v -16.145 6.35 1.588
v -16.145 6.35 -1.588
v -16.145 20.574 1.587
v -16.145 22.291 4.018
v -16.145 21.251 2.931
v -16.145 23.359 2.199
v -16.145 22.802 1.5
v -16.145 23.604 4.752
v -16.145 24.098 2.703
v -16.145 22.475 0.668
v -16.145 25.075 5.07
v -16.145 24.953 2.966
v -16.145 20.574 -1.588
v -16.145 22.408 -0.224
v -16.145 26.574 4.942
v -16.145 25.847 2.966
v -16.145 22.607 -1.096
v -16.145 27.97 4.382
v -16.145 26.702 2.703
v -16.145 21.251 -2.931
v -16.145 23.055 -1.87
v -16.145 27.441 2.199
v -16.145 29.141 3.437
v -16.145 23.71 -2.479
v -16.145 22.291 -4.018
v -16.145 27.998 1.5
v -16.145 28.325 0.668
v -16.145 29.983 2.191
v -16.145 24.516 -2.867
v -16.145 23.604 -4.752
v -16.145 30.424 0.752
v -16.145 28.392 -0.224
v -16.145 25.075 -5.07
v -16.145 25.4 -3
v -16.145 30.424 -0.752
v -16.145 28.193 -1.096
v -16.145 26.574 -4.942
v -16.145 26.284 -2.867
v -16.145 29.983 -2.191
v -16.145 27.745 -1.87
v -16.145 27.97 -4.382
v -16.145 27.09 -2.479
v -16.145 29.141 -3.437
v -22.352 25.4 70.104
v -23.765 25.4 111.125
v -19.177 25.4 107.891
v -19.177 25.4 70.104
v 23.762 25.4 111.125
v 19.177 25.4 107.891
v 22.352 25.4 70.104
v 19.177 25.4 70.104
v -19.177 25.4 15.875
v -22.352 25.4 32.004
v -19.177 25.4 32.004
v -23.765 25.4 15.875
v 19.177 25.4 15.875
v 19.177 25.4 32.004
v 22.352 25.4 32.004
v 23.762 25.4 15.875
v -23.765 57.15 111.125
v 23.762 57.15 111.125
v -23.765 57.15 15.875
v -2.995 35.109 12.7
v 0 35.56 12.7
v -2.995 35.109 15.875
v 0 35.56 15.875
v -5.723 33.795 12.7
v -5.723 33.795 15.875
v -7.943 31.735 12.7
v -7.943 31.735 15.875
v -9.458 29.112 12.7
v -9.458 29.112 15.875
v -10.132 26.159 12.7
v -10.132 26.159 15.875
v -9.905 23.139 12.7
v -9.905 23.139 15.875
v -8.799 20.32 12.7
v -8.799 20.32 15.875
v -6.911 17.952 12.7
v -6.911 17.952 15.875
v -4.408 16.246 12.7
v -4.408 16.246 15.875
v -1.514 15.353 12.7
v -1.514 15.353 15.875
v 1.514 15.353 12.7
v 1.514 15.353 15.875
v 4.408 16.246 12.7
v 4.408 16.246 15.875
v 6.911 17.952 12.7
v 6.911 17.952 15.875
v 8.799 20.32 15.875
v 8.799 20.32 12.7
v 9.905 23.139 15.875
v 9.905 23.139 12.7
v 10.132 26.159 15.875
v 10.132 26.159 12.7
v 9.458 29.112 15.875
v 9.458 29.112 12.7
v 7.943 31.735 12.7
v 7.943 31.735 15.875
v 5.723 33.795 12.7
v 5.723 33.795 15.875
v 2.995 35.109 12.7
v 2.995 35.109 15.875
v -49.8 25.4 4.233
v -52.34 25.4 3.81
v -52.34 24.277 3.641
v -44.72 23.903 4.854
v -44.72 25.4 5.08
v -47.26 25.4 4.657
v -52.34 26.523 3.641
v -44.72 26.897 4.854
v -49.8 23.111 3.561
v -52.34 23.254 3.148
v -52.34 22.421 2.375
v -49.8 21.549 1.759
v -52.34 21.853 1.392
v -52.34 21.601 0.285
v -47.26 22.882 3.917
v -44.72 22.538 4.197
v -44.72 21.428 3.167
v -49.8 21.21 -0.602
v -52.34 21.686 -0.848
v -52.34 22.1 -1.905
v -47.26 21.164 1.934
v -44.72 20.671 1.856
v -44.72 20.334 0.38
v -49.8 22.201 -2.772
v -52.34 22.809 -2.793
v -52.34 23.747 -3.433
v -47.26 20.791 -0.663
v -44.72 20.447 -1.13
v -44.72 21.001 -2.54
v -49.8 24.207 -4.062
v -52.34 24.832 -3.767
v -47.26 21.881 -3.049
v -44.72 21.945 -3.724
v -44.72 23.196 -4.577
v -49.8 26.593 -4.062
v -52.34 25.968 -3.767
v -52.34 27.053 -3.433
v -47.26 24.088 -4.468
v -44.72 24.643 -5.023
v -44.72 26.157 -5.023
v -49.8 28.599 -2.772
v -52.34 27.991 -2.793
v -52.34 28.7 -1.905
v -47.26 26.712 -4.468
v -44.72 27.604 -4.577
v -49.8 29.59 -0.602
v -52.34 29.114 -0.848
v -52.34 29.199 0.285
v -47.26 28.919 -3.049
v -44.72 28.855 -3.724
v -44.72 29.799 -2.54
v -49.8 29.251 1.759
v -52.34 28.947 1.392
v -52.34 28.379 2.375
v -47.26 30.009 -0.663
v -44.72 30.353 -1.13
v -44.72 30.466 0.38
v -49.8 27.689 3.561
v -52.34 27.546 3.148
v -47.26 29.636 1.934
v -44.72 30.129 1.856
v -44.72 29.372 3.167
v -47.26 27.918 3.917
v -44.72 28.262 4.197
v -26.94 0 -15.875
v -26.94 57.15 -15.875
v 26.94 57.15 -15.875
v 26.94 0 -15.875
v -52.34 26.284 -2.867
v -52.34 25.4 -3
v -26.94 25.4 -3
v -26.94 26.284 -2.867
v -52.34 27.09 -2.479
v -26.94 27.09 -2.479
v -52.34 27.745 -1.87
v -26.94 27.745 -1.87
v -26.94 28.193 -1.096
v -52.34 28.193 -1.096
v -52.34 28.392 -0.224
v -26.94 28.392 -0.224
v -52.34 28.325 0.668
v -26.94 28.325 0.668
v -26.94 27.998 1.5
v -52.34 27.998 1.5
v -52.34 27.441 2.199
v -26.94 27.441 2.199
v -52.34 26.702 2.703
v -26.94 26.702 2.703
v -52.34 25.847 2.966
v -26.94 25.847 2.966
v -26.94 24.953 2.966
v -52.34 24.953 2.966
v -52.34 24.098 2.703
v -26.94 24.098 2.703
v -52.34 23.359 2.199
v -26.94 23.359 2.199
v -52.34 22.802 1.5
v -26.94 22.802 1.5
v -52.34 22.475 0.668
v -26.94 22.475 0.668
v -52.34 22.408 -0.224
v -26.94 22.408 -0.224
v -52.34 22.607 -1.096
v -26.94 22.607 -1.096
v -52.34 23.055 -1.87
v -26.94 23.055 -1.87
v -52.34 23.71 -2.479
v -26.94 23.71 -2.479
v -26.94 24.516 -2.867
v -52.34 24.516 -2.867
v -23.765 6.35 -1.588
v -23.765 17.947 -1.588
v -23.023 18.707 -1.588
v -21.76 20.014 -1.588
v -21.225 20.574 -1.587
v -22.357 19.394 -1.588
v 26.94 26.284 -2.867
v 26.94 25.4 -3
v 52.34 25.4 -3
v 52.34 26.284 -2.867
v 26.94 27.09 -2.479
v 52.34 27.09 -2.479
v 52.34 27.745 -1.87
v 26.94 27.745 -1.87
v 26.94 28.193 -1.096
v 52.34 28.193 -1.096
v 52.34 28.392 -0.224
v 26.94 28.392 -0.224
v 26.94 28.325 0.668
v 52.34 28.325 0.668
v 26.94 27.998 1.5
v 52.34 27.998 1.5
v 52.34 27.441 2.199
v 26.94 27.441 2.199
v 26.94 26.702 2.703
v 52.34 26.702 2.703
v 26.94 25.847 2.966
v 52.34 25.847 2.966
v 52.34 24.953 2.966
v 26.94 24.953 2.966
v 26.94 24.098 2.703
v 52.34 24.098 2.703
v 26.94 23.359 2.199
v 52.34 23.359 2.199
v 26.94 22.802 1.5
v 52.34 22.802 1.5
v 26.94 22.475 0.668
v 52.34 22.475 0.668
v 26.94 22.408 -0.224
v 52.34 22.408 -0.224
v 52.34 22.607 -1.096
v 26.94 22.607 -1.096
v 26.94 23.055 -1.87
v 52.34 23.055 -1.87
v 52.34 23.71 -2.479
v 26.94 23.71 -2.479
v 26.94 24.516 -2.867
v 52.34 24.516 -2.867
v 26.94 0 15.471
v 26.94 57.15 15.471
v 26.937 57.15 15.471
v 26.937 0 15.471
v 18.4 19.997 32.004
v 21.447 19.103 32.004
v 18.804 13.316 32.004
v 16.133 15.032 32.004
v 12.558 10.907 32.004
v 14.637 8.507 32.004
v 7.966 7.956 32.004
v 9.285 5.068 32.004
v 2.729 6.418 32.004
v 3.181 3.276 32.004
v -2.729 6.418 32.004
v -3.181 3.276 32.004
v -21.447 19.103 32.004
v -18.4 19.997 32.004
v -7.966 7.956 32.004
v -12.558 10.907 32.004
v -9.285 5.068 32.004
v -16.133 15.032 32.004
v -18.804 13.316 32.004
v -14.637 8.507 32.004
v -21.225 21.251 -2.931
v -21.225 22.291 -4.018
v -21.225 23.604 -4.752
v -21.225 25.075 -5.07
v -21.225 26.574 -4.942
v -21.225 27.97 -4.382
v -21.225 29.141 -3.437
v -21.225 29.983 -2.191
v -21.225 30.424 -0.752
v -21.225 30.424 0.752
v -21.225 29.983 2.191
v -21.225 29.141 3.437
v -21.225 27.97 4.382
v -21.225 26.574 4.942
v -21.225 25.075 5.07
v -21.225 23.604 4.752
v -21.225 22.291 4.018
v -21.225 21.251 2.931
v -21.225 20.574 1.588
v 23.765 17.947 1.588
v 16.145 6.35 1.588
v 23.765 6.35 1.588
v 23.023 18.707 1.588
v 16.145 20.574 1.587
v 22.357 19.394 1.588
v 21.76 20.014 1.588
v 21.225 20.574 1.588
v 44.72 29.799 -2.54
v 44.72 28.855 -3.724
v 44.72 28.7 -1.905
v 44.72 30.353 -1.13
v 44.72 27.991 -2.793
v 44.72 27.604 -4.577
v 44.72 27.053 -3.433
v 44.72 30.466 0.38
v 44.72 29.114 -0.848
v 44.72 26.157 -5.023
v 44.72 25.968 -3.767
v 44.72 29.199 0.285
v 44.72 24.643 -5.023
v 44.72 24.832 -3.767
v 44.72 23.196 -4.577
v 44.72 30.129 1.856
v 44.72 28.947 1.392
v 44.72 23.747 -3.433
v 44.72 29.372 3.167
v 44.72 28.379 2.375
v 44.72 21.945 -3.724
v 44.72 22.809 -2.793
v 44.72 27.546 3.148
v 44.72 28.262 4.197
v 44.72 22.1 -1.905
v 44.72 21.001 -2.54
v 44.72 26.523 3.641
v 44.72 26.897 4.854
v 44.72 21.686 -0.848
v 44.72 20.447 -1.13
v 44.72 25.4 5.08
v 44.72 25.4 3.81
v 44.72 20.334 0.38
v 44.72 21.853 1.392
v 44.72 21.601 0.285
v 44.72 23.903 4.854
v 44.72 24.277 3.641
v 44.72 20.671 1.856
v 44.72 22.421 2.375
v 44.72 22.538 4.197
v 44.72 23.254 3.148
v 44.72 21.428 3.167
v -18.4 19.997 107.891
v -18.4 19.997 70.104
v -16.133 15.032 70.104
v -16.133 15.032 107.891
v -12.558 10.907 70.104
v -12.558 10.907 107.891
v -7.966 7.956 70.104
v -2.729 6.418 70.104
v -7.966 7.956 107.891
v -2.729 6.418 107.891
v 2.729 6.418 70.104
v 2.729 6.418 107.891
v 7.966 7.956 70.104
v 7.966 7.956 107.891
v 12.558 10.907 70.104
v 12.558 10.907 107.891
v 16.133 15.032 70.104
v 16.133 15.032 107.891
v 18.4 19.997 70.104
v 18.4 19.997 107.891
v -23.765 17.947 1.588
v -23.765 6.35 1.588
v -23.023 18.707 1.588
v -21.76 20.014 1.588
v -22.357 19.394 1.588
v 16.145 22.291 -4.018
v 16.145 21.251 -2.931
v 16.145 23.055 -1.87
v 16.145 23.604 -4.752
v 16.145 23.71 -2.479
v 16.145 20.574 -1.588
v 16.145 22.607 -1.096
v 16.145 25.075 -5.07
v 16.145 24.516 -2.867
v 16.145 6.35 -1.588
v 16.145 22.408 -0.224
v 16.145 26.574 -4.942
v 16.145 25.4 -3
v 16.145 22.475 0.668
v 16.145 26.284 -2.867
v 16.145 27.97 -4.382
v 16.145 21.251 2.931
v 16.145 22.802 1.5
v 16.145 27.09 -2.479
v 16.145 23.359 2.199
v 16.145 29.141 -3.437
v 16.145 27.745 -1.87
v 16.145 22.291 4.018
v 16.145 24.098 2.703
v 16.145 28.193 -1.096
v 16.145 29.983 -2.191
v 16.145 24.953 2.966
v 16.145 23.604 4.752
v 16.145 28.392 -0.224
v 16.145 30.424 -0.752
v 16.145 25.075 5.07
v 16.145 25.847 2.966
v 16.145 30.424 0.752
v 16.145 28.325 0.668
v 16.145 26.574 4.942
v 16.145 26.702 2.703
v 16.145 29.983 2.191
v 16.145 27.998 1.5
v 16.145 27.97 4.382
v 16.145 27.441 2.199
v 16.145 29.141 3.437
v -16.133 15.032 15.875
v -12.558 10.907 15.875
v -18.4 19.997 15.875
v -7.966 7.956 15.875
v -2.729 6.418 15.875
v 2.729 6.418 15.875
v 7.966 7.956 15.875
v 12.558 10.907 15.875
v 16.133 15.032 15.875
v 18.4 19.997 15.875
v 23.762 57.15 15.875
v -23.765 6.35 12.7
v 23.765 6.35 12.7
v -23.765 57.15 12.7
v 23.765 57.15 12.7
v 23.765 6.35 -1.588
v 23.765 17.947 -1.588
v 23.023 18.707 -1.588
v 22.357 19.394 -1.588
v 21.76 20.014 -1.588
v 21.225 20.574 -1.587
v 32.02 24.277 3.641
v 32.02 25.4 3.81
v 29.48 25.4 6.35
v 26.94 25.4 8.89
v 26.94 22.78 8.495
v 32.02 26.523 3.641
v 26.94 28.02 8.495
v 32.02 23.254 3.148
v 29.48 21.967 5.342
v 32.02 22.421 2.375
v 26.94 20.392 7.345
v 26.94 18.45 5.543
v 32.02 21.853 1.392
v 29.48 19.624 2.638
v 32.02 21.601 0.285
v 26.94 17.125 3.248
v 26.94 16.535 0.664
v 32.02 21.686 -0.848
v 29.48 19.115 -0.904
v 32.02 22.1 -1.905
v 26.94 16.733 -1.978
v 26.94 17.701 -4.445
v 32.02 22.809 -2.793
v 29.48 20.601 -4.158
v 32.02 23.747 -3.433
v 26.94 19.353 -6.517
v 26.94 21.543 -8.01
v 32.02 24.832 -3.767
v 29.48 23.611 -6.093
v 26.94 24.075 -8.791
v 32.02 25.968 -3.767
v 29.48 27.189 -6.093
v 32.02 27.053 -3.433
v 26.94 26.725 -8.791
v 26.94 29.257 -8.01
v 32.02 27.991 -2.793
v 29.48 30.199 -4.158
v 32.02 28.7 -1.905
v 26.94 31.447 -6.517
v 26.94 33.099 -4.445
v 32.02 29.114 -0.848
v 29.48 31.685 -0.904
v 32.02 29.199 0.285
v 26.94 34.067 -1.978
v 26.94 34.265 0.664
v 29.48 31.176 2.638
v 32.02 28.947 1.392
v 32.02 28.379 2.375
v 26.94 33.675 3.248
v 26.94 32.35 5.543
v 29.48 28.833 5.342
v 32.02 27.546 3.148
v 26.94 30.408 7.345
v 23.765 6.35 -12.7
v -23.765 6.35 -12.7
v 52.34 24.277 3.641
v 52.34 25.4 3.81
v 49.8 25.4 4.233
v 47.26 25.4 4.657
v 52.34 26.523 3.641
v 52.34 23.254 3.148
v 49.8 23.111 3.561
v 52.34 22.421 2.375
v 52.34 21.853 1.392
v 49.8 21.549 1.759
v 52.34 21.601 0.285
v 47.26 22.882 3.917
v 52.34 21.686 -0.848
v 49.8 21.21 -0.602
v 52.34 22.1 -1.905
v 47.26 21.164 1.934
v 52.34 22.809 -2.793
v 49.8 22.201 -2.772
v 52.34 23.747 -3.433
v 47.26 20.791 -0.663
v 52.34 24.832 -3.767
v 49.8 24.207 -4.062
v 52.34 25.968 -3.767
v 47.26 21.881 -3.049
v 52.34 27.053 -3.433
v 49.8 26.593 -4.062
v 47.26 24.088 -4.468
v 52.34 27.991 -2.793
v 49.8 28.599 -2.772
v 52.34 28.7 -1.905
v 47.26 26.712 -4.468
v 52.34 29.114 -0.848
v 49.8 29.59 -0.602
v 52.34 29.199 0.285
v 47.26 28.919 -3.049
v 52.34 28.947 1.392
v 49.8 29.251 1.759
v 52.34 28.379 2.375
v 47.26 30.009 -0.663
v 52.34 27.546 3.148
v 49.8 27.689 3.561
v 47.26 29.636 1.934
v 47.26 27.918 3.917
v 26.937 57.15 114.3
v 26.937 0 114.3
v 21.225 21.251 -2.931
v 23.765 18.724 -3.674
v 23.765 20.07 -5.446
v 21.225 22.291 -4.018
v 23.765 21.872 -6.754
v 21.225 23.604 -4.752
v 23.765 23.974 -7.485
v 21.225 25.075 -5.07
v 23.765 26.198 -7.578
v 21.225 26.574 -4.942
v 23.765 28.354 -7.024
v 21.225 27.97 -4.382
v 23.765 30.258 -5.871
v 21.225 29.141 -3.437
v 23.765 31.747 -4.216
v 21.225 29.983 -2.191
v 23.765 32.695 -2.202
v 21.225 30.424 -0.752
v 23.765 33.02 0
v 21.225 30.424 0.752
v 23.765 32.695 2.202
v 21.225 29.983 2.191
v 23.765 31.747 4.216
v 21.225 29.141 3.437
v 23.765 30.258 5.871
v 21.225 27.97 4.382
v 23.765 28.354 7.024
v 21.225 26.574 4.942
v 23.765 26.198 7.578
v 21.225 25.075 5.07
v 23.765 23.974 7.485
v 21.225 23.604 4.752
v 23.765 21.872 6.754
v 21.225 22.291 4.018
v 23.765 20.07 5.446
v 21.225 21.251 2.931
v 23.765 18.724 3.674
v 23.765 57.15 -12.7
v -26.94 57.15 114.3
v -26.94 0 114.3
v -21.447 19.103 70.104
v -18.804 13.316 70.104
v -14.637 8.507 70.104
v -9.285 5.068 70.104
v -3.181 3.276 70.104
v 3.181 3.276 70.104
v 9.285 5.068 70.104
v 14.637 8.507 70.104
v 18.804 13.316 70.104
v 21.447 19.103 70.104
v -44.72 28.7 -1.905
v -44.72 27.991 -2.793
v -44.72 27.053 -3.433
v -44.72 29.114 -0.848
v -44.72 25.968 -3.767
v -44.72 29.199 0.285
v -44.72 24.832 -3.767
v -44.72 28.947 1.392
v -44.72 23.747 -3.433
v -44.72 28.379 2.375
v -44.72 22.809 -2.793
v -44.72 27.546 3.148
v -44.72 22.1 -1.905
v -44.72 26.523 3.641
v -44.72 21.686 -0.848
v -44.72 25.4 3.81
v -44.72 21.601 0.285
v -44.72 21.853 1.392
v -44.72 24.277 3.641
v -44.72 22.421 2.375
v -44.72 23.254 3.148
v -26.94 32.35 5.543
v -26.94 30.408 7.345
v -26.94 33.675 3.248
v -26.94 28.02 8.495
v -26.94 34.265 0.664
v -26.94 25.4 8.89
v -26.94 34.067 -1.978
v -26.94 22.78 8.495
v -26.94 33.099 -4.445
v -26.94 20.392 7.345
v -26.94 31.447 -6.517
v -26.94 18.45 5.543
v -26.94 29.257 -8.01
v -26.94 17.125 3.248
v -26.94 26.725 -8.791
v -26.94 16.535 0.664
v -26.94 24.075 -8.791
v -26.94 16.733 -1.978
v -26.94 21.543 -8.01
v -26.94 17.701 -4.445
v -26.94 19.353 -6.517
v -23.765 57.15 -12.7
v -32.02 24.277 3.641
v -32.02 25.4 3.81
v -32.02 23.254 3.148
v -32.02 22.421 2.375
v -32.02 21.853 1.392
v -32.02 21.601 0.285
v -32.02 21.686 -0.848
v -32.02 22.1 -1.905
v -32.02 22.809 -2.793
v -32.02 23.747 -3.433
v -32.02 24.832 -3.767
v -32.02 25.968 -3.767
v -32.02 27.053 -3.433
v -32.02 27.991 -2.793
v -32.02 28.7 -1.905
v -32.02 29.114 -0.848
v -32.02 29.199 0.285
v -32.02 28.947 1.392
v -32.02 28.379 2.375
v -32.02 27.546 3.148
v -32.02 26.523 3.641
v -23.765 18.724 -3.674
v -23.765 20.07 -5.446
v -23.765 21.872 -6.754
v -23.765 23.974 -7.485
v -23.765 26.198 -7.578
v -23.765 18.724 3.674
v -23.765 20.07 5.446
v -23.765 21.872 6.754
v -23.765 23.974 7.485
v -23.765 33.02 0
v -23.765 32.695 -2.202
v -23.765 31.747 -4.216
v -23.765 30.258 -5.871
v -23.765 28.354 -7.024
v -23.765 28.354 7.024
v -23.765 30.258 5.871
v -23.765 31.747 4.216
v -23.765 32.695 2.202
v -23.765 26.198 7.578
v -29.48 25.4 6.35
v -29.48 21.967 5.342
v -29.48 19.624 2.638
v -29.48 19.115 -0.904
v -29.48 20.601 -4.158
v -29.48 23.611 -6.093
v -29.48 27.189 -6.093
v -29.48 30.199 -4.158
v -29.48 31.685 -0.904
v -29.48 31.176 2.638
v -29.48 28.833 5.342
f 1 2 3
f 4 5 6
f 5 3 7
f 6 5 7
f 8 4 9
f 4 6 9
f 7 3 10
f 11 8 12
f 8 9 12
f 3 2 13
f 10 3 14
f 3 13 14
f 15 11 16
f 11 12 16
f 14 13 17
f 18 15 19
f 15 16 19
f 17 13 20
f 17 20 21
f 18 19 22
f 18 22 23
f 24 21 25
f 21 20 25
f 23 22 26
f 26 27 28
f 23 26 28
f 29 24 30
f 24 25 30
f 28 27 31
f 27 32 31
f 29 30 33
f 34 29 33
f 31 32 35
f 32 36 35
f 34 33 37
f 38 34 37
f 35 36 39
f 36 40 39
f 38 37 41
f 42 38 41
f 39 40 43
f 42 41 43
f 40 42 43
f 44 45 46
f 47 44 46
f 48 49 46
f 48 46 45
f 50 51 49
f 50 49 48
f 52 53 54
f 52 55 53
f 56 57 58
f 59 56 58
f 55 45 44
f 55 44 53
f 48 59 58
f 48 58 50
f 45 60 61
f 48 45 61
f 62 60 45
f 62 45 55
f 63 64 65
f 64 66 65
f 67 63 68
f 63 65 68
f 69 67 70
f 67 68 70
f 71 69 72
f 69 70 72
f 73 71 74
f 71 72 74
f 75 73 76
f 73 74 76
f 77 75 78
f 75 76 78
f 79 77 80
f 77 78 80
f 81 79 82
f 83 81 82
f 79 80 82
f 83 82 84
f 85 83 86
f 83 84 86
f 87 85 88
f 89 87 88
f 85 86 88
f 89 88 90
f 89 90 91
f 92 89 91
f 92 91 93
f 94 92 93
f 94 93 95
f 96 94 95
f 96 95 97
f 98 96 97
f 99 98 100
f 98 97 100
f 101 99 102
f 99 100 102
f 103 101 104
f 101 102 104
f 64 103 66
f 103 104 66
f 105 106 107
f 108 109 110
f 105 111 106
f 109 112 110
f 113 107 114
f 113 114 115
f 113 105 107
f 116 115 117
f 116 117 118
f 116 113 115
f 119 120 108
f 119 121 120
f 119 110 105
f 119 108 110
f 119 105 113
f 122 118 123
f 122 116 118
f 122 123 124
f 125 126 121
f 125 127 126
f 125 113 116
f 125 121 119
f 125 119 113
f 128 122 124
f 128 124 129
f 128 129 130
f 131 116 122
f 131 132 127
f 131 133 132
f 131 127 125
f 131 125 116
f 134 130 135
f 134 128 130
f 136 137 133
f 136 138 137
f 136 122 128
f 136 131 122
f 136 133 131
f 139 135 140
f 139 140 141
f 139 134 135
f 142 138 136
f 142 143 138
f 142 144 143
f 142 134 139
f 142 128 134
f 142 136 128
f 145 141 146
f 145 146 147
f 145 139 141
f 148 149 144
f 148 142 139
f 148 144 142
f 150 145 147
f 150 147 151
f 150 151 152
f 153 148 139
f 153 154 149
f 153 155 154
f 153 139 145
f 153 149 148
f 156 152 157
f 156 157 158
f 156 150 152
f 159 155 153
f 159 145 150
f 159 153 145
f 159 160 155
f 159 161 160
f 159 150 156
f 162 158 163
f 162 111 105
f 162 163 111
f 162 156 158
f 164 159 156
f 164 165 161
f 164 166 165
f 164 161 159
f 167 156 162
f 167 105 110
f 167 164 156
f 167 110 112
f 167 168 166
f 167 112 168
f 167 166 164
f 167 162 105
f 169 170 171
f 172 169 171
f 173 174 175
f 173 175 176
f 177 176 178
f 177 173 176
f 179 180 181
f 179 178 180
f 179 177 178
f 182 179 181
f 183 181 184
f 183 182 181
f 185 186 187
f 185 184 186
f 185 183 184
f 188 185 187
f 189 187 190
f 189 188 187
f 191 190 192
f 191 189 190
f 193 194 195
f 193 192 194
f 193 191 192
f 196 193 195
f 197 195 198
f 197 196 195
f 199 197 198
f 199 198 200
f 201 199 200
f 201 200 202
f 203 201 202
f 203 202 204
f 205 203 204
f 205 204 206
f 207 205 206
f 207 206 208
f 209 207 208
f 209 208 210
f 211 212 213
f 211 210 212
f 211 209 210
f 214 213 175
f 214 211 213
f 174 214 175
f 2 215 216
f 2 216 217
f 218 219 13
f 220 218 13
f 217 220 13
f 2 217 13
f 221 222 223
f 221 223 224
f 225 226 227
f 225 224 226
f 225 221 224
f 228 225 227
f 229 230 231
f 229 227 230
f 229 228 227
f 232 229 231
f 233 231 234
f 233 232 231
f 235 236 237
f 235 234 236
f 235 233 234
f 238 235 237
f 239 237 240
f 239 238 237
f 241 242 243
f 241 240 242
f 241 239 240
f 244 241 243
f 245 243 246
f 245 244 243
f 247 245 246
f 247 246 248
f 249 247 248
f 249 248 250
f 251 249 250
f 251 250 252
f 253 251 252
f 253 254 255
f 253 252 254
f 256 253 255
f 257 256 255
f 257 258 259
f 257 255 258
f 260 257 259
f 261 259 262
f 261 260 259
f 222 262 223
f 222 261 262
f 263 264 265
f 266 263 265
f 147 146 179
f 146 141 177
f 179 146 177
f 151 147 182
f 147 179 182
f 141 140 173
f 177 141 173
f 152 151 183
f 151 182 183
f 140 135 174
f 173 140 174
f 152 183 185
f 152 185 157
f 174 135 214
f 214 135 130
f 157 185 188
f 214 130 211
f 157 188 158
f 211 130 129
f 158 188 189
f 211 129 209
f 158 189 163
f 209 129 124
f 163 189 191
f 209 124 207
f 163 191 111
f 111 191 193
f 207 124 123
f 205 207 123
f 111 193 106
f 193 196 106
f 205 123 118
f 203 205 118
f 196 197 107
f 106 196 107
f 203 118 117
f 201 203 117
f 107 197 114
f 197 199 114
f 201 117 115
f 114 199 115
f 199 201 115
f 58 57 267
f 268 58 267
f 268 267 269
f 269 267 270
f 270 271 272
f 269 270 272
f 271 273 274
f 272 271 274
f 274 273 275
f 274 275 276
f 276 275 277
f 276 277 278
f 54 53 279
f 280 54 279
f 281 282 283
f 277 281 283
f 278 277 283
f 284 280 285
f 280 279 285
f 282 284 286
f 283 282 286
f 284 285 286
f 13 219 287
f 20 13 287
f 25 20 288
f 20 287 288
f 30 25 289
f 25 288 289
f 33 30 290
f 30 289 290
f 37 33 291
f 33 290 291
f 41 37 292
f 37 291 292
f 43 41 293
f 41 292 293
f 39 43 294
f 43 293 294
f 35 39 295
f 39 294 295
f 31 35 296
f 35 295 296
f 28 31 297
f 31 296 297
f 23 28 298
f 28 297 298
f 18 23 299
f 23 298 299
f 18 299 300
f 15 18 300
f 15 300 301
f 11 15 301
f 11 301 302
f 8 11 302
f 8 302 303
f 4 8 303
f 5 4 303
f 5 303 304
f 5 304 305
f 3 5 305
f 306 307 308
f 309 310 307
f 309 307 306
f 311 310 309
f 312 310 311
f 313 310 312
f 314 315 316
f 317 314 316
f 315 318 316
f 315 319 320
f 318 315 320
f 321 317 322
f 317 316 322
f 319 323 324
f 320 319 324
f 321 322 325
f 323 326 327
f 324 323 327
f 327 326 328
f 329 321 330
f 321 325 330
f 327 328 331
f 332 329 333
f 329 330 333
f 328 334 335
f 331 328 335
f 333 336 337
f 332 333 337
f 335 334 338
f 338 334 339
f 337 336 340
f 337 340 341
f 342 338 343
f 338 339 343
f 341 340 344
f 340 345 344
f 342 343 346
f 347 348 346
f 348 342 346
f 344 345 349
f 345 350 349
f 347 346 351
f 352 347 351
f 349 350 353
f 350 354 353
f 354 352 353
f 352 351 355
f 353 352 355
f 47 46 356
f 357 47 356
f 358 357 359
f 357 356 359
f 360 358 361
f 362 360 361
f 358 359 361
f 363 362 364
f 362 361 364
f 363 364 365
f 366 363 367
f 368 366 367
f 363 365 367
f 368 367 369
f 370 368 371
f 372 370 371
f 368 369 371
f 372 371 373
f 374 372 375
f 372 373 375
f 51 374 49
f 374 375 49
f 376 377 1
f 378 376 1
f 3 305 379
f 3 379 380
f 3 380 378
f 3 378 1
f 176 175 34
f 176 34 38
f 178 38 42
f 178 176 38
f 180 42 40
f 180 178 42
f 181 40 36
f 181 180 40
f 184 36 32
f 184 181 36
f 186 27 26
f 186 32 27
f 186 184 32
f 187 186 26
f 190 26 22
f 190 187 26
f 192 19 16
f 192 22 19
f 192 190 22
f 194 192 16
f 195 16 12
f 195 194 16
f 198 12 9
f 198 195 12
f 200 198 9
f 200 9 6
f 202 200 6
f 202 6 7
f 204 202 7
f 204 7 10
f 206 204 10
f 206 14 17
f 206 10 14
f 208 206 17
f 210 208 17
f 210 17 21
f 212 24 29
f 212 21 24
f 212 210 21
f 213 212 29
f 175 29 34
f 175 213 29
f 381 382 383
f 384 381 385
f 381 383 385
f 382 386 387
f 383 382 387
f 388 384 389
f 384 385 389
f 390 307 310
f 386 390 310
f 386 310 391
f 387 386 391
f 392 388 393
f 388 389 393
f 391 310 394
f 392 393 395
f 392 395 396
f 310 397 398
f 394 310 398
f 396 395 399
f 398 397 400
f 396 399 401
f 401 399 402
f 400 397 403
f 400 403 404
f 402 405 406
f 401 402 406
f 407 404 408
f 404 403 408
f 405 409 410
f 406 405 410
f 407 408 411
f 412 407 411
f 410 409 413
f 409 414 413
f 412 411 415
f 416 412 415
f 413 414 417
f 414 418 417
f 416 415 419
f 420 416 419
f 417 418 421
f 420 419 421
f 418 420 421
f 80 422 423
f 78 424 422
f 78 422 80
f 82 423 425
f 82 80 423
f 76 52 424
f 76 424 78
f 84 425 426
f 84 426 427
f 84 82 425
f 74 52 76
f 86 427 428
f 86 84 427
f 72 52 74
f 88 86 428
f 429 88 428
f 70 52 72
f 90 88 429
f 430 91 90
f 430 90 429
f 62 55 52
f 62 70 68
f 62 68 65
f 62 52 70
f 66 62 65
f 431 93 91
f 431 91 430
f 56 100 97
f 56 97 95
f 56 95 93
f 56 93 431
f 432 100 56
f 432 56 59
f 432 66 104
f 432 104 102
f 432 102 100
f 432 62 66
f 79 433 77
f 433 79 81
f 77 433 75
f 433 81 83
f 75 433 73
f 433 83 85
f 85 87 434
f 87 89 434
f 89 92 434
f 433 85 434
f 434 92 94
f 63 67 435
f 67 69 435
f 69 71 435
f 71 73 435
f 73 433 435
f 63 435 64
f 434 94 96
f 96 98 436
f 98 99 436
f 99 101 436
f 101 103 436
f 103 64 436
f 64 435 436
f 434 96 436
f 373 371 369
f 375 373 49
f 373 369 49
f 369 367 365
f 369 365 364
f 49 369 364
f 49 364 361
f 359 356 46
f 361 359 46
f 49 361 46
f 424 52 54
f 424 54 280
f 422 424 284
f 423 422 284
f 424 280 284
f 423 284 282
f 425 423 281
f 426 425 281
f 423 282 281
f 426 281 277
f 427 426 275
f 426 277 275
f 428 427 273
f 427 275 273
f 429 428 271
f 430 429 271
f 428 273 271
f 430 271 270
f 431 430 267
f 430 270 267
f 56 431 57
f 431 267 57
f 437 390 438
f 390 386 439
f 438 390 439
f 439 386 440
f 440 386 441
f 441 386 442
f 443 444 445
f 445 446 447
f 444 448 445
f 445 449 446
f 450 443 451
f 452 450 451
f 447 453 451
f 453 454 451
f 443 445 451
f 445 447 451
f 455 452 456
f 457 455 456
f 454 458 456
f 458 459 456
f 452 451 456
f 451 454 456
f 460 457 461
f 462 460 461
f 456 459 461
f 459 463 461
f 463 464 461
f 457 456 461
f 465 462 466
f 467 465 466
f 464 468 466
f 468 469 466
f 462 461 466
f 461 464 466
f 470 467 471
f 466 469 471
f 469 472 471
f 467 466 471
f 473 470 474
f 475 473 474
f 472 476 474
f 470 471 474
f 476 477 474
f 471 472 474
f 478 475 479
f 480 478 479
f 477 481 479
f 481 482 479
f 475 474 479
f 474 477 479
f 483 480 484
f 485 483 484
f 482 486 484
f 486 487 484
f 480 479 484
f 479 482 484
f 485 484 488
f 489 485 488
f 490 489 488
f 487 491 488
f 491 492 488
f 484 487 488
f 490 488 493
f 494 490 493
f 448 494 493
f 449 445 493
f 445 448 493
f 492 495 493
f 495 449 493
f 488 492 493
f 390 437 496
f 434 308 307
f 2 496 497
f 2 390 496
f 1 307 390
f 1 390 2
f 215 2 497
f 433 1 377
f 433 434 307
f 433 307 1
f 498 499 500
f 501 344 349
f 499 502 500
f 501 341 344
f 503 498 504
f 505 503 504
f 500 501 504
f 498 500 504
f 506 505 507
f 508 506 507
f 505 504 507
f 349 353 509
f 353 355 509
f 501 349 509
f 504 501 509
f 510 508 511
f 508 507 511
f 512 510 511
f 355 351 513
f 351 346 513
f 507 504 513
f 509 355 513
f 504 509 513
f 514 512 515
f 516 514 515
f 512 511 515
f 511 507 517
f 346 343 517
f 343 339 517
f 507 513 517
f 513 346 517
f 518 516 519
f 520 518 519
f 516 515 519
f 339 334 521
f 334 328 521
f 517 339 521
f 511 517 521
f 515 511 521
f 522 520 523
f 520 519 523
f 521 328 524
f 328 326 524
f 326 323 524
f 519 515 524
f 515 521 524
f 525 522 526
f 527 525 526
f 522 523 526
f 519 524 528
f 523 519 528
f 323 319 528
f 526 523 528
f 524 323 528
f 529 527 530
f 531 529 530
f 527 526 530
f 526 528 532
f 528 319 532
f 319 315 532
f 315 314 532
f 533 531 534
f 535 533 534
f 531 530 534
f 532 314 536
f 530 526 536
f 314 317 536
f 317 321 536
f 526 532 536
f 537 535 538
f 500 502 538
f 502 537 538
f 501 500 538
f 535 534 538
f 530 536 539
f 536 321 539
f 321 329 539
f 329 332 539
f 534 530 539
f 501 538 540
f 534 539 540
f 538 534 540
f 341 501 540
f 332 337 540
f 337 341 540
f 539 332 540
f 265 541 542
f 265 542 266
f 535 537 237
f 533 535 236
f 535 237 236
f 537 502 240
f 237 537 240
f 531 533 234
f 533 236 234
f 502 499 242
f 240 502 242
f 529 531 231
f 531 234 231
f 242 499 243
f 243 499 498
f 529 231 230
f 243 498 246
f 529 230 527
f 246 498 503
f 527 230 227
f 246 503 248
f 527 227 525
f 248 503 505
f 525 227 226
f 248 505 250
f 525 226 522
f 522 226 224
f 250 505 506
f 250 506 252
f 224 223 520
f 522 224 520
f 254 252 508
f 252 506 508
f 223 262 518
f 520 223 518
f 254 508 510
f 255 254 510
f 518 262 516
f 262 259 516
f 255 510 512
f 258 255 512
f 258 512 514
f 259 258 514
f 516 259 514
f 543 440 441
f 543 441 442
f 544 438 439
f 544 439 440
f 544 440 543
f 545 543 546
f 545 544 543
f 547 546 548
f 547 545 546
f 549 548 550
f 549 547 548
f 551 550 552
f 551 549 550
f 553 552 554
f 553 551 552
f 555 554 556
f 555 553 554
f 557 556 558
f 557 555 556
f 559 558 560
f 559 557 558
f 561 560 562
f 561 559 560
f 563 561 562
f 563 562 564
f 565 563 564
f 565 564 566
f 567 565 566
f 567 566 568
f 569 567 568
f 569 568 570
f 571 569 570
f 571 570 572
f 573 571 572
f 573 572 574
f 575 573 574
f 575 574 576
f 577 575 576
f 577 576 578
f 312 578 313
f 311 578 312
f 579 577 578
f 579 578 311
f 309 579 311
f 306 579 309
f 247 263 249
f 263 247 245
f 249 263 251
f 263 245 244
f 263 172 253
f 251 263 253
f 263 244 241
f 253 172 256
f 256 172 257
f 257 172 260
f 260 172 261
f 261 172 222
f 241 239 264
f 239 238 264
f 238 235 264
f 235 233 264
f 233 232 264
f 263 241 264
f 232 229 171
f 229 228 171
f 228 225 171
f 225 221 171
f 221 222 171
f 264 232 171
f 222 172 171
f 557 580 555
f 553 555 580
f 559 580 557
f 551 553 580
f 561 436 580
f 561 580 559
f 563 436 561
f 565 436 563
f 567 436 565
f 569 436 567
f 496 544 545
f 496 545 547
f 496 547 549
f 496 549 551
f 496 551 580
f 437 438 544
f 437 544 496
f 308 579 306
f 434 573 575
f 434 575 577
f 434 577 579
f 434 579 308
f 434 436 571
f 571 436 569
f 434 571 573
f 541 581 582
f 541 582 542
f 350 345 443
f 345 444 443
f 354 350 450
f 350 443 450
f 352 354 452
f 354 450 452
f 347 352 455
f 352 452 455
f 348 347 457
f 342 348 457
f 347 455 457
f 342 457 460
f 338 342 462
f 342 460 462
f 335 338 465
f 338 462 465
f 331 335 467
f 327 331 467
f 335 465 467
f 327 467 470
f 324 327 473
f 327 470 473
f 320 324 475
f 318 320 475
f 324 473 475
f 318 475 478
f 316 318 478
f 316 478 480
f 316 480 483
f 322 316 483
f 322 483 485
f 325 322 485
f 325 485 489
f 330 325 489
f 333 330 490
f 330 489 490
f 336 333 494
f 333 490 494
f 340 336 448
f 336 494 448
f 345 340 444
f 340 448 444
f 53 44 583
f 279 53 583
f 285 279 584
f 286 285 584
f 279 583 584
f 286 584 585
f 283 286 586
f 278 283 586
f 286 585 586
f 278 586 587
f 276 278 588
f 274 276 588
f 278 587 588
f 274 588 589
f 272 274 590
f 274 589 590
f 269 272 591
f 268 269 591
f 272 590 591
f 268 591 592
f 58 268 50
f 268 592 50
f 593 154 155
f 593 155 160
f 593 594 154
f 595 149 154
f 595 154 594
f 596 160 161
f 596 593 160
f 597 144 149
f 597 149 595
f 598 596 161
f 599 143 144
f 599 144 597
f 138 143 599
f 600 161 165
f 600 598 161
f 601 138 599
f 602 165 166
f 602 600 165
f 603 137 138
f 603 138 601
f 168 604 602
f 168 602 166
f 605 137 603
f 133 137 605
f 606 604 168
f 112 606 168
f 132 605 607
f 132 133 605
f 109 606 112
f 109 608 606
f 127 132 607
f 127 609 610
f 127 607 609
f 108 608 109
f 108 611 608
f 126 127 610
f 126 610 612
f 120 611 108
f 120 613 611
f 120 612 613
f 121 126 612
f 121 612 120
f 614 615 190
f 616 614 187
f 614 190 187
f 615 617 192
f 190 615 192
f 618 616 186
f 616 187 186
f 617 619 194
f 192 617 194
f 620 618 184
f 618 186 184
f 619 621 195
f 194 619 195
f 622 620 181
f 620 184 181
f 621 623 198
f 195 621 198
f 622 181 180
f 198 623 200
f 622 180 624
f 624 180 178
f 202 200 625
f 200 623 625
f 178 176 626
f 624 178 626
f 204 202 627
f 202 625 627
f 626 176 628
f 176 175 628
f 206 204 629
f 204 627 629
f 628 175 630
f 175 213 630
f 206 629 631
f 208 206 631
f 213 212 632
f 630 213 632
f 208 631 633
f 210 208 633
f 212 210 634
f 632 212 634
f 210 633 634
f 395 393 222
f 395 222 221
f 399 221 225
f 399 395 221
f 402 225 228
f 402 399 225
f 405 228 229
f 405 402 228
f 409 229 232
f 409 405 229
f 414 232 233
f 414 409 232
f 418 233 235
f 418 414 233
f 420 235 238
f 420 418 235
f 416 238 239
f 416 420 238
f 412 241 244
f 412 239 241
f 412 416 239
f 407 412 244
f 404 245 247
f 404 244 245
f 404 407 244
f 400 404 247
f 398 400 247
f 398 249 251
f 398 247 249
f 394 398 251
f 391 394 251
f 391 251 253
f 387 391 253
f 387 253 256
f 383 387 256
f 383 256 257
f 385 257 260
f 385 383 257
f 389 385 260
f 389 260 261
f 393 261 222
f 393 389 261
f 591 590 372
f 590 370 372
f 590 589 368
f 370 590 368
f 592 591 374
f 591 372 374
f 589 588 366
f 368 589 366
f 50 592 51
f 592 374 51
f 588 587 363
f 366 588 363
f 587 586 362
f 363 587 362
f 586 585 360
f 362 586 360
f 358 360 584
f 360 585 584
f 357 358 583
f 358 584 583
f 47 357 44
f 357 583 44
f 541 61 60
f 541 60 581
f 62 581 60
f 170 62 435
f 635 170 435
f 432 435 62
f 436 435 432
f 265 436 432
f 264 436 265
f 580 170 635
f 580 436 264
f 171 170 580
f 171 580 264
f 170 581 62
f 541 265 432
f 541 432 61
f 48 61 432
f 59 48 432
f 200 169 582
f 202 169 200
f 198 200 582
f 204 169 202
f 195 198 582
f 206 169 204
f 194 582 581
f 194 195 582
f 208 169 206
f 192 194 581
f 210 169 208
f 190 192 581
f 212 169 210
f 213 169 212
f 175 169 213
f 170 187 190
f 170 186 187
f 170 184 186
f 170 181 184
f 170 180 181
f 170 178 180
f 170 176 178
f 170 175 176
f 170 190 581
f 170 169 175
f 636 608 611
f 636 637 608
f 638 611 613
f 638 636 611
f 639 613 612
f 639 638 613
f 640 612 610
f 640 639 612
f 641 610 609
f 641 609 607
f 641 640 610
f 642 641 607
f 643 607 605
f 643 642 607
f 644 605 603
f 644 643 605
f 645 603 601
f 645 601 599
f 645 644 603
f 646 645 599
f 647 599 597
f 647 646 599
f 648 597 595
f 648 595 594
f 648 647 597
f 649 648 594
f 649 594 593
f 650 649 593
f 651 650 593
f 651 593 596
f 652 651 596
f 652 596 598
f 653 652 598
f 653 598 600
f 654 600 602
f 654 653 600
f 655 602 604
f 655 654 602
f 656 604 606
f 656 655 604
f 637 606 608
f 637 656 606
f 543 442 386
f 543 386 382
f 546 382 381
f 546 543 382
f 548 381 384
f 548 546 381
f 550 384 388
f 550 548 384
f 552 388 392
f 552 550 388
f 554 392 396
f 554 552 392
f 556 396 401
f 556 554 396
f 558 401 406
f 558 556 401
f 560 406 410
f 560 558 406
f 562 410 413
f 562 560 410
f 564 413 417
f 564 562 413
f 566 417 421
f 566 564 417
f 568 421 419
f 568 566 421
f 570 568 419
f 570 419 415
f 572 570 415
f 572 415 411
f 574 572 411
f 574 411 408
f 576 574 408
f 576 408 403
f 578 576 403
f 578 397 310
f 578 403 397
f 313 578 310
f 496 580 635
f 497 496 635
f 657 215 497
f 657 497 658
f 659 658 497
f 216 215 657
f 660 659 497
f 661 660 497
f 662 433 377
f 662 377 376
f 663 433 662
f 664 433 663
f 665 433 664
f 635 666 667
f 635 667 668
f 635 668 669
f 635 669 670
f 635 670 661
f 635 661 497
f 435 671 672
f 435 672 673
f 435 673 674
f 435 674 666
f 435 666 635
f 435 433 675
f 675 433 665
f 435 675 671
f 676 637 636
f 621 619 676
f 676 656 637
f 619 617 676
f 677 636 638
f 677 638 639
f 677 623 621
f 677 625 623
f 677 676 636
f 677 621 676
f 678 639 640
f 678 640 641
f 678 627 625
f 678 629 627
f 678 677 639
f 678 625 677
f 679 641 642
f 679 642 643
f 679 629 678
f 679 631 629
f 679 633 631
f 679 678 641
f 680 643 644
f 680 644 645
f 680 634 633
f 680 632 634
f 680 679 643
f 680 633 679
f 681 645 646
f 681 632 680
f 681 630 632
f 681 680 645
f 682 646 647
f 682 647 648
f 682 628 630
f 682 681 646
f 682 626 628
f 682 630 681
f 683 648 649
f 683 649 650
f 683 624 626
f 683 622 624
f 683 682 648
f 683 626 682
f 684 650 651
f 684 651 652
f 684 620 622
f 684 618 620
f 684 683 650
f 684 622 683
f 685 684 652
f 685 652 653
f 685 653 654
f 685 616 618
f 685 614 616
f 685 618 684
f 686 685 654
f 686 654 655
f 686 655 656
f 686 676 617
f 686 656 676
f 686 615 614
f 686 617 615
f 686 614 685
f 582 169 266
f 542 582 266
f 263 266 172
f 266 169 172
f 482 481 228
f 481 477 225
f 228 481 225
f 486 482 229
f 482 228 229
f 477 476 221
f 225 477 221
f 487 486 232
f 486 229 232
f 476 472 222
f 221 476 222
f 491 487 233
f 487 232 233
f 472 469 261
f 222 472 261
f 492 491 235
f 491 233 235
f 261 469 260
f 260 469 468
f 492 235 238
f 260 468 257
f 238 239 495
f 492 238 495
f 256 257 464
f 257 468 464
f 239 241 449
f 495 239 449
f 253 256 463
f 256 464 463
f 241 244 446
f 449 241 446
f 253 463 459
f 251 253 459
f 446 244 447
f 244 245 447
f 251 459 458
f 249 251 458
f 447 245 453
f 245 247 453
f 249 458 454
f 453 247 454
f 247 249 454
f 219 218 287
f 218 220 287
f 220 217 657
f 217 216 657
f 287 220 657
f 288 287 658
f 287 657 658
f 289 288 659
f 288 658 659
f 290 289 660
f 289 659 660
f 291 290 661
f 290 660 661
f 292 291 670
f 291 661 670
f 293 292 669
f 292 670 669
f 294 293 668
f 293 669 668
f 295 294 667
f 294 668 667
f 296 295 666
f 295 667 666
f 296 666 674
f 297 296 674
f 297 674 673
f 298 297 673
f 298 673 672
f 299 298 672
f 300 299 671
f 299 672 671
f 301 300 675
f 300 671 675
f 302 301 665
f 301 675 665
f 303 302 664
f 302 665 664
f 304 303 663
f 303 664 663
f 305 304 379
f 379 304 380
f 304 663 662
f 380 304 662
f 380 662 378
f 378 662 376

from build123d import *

# Parameters (mm, degrees)
BOSS_EXTRUDE1_DEPTH     = 12.7
SKETCH2_W               = 53.879496
SKETCH2_H               = 57.15
BOSS_EXTRUDE2_DEPTH     = 3.175
CUT_EXTRUDE2_DEPTH      = 80.104913537
CUT_EXTRUDE2_DEPTH_BACK = 80.104913537
SKETCH3_R               = 3
SKETCH5_W               = 53.879496
SKETCH5_H               = 25.4
SKETCH5_R               = 3.4925
BOSS_EXTRUDE3_DEPTH     = 6.35
SKETCH7_W               = 7.62
SKETCH7_H               = 15.609396712
BOSS_EXTRUDE7_DEPTH     = 1.5875
SKETCH8_W               = 53.879496
SKETCH8_H               = 57.15
BOSS_EXTRUDE8_DEPTH     = 101.6
CUT_EXTRUDE7_DEPTH      = 139.094394241
CUT_EXTRUDE7_DEPTH_BACK = 139.094394241
SKETCH13_W              = 0.002356984
SKETCH13_H              = 98.829061331
SKETCH14_W              = 47.527139016
SKETCH14_H              = 95.25
CUT_EXTRUDE8_DEPTH      = 31.75
CUT_EXTRUDE9_DEPTH      = 4.229066359
SKETCH16_W              = 53.879496
SKETCH16_H              = 25.4
CUT_EXTRUDE10_DEPTH     = 136.589746001


with BuildPart() as part:
    # Sketch1 → Boss-Extrude1 (new, symmetric)
    with BuildSketch(Plane.XY):
        Polygon((-26.939748, 0), (26.939748, 0), (26.939748, 6.35), (26.939748, 57.15), (23.764748, 57.15), (23.764748, 6.35), (-23.764748, 6.35), (-23.764748, 57.15), (-26.939748, 57.15), (-26.939748, 6.35), align=None)
    extrude(amount=BOSS_EXTRUDE1_DEPTH, both=True)

    # Sketch2 → Boss-Extrude2 (add)
    with BuildSketch(Plane(origin=(0, 0, -12.7), x_dir=(-1, 0, 0), z_dir=(0, 0, -1))):
        with Locations((0, 28.575)):
            Rectangle(SKETCH2_W, SKETCH2_H)
    extrude(amount=BOSS_EXTRUDE2_DEPTH)

    # Sketch6 → Revolve2 (revolve)
    with BuildSketch(Plane.XY, mode=Mode.PRIVATE) as revolve2_sk:
        Polygon((-23.764748, 25.4), (-16.144748, 25.4), (-16.144748, 30.48), (-21.224748, 30.48), (-23.764748, 33.02), align=None)
        Polygon((23.764748, 33.02), (23.764748, 25.4), (16.144748, 25.4), (16.144748, 30.48), (21.224748, 30.48), align=None)
    revolve(revolve2_sk.sketch.rotate(Axis((-23.764748, 25.4, 0), (1, 0, 0)), 90), axis=Axis((-23.764748, 25.4, 0), (1, 0, 0)))


with BuildPart() as body_2:
    # Sketch4 → Revolve1 (revolve)
    with BuildSketch(Plane.XY, mode=Mode.PRIVATE) as revolve1_sk:
        Polygon((-32.019748, 29.21), (-26.939748, 34.29), (-26.939748, 29.21), (-26.939748, 26.924), (-26.939748, 25.4), (-52.339748, 25.4), (-52.339748, 26.924), (-52.339748, 29.21), (-44.719748, 30.48), (-44.719748, 29.21), align=None)
        Polygon((26.939748, 34.29), (26.939748, 29.21), (26.939748, 26.924), (26.939748, 25.4), (52.339748, 25.4), (52.339748, 26.924), (52.339748, 29.21), (44.719748, 30.48), (44.719748, 29.21), (32.019748, 29.21), align=None)
    revolve(revolve1_sk.sketch.rotate(Axis((25.4, 25.4, 0), (1, 0, 0)), 90), axis=Axis((25.4, 25.4, 0), (1, 0, 0)))


with BuildPart() as cut_extrude2_tool:
    # Sketch3 → Cut-Extrude2 (new, two sides: drawn at the far end of the back side and taken through both)
    with BuildSketch(Plane(origin=(0, 0, 0), x_dir=(0, 0, -1), z_dir=(1, 0, 0)).offset(-CUT_EXTRUDE2_DEPTH_BACK)):
        with Locations((0, 25.4)):
            Circle(SKETCH3_R)
    extrude(amount=CUT_EXTRUDE2_DEPTH + CUT_EXTRUDE2_DEPTH_BACK)


with BuildPart() as part_1:
    add(part.part)

    # Cut-Extrude2: cut by cut_extrude2_tool
    add(cut_extrude2_tool.part, mode=Mode.SUBTRACT)

    # Sketch5 → Boss-Extrude3 (add)
    with BuildSketch(Plane.XZ):
        with Locations((0, -28.575)):
            Rectangle(SKETCH5_W, SKETCH5_H)
        with Locations(Location((7.889748, -28.575, 0), (0, 0, 270))):
            Circle(SKETCH5_R, mode=Mode.SUBTRACT)
        with Locations(Location((-17.510252, -28.575, 0), (0, 0, 270))):
            Circle(SKETCH5_R, mode=Mode.SUBTRACT)
    extrude(amount=-BOSS_EXTRUDE3_DEPTH)

    # Sketch7 → Boss-Extrude7 (add, symmetric)
    with BuildSketch(Plane.XY):
        with Locations((-19.954748, 14.154698356)):
            Rectangle(SKETCH7_W, SKETCH7_H)
        with Locations((19.954748, 14.154698356)):
            Rectangle(SKETCH7_W, SKETCH7_H)
    extrude(amount=BOSS_EXTRUDE7_DEPTH, both=True)

    # Sketch8 → Boss-Extrude8 (add)
    with BuildSketch(Plane.XY.offset(12.7)):
        with Locations((0, 28.575)):
            Rectangle(SKETCH8_W, SKETCH8_H)
    extrude(amount=BOSS_EXTRUDE8_DEPTH)

    # Sketch9 → Cut-Revolve1 (revolve, cut)
    with BuildSketch(Plane(origin=(0, 0, 0), x_dir=(0, 0, -1), z_dir=(1, 0, 0))):
        Polygon((-70.104, 47.752), (-70.104, 44.577), (-107.890879501, 44.577), (-107.890879501, 25.4), (-70.104, 25.4), (0, 25.4), (0, 35.56), (-20.104066359, 35.56), (-20.104066359, 44.577), (-32.004, 44.577), (-32.004, 47.752), align=None)
    revolve(axis=Axis((0, 25.4, 0), (0, 0, 1)), mode=Mode.SUBTRACT)

    # Sketch13 → Cut-Extrude7 (cut, two sides: drawn at the far end of the back side and taken through both)
    with BuildSketch(Plane(origin=(0, 0, 0), x_dir=(-1, 0, 0), z_dir=(0, -1, 0)).offset(-CUT_EXTRUDE7_DEPTH_BACK)):
        with Locations((26.940926492, -64.885469335)):
            Rectangle(SKETCH13_W, SKETCH13_H)
        with Locations((-26.938569508, -64.885469335)):
            Rectangle(SKETCH13_W, SKETCH13_H)
    extrude(amount=CUT_EXTRUDE7_DEPTH + CUT_EXTRUDE7_DEPTH_BACK, mode=Mode.SUBTRACT)

    # Sketch14 → Cut-Extrude8 (cut)
    with BuildSketch(Plane(origin=(0, 57.15, 0), x_dir=(1, 0, 0), z_dir=(0, 1, 0))):
        with Locations((-0.001178492, -63.5)):
            Rectangle(SKETCH14_W, SKETCH14_H)
    extrude(amount=-CUT_EXTRUDE8_DEPTH, mode=Mode.SUBTRACT)

    # Sketch15 → Cut-Extrude9 (cut)
    with BuildSketch(Plane.XY.offset(20.104066359)):
        with BuildLine():
            Line((-10.16, 25.4), (-19.177, 25.4))
            ThreePointArc((-19.177, 25.4), (0, 6.223), (19.177, 25.4))
            Line((19.177, 25.4), (10.16, 25.4))
            ThreePointArc((10.16, 25.4), (0, 15.24), (-10.16, 25.4))
        make_face()
    extrude(amount=-CUT_EXTRUDE9_DEPTH, mode=Mode.SUBTRACT)

    # Sketch16 → Cut-Extrude10 (cut, through all)
    with BuildSketch(Plane(origin=(0, 6.35, 0), x_dir=(1, 0, 0), z_dir=(0, 1, 0))):
        with Locations((0, 28.575)):
            Rectangle(SKETCH16_W, SKETCH16_H)
    extrude(amount=-CUT_EXTRUDE10_DEPTH, mode=Mode.SUBTRACT)


with BuildPart() as body_2_1:
    add(body_2.part)

    # Cut-Extrude2: cut by cut_extrude2_tool
    add(cut_extrude2_tool.part, mode=Mode.SUBTRACT)


solid = Compound([part_1.part, body_2_1.part])
